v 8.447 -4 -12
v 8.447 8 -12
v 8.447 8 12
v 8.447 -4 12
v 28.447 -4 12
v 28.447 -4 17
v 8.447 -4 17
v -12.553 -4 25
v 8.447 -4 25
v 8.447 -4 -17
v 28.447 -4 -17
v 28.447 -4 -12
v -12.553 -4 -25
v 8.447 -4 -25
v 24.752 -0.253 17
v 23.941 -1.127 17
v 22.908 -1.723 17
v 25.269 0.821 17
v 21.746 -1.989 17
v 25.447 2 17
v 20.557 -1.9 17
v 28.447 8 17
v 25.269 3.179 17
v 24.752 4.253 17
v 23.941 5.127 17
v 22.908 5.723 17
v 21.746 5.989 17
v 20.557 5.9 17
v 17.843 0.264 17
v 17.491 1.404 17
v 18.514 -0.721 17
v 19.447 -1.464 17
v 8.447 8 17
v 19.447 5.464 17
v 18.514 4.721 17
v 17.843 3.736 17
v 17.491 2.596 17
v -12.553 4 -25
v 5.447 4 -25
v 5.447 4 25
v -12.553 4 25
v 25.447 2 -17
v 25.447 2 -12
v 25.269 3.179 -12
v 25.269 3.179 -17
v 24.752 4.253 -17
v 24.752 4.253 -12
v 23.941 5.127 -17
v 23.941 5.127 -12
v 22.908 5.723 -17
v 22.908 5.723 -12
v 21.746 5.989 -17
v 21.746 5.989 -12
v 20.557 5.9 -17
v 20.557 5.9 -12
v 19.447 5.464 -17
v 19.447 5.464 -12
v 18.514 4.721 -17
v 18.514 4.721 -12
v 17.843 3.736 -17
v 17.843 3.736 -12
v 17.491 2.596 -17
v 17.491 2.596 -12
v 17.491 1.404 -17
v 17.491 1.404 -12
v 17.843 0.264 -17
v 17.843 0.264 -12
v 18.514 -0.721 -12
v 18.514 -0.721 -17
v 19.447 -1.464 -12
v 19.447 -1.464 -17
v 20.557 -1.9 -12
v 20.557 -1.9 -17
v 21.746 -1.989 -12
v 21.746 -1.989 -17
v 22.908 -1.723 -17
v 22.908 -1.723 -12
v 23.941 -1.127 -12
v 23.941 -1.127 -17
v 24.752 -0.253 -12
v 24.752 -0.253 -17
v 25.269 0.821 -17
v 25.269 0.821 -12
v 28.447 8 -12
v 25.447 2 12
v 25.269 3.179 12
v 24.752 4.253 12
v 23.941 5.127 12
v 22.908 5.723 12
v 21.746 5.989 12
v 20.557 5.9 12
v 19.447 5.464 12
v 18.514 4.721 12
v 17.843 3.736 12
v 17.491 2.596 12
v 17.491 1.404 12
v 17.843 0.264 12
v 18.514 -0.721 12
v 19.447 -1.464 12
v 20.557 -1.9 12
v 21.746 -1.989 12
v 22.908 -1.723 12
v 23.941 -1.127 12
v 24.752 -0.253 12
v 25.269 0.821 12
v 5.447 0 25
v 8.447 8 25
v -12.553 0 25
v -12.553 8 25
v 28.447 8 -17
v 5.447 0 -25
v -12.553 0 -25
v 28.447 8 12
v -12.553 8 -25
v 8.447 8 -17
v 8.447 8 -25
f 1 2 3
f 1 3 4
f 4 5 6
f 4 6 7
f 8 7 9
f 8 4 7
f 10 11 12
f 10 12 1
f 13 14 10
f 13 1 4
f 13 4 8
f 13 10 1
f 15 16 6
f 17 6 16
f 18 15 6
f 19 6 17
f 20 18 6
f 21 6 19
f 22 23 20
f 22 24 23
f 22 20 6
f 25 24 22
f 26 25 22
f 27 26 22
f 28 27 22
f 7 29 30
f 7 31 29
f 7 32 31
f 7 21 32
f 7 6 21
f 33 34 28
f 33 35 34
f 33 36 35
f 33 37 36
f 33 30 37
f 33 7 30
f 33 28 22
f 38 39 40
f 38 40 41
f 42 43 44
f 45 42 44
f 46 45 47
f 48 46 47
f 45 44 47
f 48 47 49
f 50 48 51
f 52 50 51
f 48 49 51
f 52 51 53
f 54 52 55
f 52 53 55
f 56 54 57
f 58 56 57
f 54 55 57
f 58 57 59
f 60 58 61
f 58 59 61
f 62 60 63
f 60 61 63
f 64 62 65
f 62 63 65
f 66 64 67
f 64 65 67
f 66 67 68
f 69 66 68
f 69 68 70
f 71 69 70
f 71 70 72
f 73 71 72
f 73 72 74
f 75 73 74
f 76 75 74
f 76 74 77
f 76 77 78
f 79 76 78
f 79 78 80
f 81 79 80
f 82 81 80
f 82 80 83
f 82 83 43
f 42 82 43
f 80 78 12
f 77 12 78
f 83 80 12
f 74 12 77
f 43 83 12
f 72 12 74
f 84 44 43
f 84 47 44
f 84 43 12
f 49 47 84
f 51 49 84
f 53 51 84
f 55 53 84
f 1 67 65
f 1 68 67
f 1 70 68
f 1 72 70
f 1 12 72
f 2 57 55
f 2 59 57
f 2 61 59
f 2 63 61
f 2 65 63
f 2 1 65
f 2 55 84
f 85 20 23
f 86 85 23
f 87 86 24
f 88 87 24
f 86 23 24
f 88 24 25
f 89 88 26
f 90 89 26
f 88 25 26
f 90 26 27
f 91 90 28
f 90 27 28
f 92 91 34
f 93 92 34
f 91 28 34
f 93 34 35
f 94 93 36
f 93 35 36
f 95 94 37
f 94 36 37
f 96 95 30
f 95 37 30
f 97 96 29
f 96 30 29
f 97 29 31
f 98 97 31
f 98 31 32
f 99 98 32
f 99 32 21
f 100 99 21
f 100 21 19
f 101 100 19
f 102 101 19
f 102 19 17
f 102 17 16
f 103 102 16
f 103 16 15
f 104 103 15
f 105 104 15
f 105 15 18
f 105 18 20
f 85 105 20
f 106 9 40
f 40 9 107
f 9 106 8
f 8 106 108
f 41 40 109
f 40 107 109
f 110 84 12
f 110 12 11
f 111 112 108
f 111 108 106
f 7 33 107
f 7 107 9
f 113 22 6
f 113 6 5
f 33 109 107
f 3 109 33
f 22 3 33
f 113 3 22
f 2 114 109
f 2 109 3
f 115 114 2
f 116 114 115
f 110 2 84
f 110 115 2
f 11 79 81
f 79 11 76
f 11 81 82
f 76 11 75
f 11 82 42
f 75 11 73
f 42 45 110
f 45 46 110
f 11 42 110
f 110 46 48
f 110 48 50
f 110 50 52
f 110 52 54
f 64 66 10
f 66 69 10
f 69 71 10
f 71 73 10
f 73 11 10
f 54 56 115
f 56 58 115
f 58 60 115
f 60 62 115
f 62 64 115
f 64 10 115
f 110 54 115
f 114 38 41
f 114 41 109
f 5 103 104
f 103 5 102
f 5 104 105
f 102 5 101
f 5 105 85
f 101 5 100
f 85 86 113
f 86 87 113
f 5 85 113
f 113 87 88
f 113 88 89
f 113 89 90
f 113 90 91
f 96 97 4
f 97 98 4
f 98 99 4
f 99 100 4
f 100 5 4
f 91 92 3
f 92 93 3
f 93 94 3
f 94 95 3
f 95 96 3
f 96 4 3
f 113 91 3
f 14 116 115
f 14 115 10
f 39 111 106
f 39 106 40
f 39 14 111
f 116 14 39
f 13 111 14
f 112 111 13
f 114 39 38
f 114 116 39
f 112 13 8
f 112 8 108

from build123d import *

# Parameters (mm, degrees)
EXTRUDE_1_DEPTH      = 25
EXTRUDE_1_DEPTH_BACK = 25
SKETCH_2_W           = 5
SKETCH_2_H           = 12
EXTRUDE_2_DEPTH      = 20
SKETCH_3_R           = 4
CUT_EXTRUDE_1_DEPTH  = 41


with BuildPart() as part:
    # 草图1 → 凸台-拉伸1 (new, two sides: drawn at the far end of the back side and taken through both)
    with BuildSketch(Plane.XY.offset(-EXTRUDE_1_DEPTH_BACK)):
        Polygon((-12.553319429, 0), (5.446680571, 0), (5.446680571, 4), (-12.553319429, 4), (-12.553319429, 8), (8.446680571, 8), (8.446680571, -4), (-12.553319429, -4), align=None)
    extrude(amount=EXTRUDE_1_DEPTH + EXTRUDE_1_DEPTH_BACK)

    # 草图2 → 凸台-拉伸2 (add)
    with BuildSketch(Plane(origin=(8.446680571, 0, 0), x_dir=(0, 0, -1), z_dir=(1, 0, 0))):
        with Locations((-14.5, 2)):
            Rectangle(SKETCH_2_W, SKETCH_2_H)
        with Locations((14.5, 2)):
            Rectangle(SKETCH_2_W, SKETCH_2_H)
    extrude(amount=EXTRUDE_2_DEPTH)

    # 草图3 → 切除-拉伸1 (cut)
    with BuildSketch(Plane.XY.offset(17)):
        with Locations((21.446680571, 2)):
            Circle(SKETCH_3_R)
    extrude(amount=-CUT_EXTRUDE_1_DEPTH, mode=Mode.SUBTRACT)


solid = part.part
